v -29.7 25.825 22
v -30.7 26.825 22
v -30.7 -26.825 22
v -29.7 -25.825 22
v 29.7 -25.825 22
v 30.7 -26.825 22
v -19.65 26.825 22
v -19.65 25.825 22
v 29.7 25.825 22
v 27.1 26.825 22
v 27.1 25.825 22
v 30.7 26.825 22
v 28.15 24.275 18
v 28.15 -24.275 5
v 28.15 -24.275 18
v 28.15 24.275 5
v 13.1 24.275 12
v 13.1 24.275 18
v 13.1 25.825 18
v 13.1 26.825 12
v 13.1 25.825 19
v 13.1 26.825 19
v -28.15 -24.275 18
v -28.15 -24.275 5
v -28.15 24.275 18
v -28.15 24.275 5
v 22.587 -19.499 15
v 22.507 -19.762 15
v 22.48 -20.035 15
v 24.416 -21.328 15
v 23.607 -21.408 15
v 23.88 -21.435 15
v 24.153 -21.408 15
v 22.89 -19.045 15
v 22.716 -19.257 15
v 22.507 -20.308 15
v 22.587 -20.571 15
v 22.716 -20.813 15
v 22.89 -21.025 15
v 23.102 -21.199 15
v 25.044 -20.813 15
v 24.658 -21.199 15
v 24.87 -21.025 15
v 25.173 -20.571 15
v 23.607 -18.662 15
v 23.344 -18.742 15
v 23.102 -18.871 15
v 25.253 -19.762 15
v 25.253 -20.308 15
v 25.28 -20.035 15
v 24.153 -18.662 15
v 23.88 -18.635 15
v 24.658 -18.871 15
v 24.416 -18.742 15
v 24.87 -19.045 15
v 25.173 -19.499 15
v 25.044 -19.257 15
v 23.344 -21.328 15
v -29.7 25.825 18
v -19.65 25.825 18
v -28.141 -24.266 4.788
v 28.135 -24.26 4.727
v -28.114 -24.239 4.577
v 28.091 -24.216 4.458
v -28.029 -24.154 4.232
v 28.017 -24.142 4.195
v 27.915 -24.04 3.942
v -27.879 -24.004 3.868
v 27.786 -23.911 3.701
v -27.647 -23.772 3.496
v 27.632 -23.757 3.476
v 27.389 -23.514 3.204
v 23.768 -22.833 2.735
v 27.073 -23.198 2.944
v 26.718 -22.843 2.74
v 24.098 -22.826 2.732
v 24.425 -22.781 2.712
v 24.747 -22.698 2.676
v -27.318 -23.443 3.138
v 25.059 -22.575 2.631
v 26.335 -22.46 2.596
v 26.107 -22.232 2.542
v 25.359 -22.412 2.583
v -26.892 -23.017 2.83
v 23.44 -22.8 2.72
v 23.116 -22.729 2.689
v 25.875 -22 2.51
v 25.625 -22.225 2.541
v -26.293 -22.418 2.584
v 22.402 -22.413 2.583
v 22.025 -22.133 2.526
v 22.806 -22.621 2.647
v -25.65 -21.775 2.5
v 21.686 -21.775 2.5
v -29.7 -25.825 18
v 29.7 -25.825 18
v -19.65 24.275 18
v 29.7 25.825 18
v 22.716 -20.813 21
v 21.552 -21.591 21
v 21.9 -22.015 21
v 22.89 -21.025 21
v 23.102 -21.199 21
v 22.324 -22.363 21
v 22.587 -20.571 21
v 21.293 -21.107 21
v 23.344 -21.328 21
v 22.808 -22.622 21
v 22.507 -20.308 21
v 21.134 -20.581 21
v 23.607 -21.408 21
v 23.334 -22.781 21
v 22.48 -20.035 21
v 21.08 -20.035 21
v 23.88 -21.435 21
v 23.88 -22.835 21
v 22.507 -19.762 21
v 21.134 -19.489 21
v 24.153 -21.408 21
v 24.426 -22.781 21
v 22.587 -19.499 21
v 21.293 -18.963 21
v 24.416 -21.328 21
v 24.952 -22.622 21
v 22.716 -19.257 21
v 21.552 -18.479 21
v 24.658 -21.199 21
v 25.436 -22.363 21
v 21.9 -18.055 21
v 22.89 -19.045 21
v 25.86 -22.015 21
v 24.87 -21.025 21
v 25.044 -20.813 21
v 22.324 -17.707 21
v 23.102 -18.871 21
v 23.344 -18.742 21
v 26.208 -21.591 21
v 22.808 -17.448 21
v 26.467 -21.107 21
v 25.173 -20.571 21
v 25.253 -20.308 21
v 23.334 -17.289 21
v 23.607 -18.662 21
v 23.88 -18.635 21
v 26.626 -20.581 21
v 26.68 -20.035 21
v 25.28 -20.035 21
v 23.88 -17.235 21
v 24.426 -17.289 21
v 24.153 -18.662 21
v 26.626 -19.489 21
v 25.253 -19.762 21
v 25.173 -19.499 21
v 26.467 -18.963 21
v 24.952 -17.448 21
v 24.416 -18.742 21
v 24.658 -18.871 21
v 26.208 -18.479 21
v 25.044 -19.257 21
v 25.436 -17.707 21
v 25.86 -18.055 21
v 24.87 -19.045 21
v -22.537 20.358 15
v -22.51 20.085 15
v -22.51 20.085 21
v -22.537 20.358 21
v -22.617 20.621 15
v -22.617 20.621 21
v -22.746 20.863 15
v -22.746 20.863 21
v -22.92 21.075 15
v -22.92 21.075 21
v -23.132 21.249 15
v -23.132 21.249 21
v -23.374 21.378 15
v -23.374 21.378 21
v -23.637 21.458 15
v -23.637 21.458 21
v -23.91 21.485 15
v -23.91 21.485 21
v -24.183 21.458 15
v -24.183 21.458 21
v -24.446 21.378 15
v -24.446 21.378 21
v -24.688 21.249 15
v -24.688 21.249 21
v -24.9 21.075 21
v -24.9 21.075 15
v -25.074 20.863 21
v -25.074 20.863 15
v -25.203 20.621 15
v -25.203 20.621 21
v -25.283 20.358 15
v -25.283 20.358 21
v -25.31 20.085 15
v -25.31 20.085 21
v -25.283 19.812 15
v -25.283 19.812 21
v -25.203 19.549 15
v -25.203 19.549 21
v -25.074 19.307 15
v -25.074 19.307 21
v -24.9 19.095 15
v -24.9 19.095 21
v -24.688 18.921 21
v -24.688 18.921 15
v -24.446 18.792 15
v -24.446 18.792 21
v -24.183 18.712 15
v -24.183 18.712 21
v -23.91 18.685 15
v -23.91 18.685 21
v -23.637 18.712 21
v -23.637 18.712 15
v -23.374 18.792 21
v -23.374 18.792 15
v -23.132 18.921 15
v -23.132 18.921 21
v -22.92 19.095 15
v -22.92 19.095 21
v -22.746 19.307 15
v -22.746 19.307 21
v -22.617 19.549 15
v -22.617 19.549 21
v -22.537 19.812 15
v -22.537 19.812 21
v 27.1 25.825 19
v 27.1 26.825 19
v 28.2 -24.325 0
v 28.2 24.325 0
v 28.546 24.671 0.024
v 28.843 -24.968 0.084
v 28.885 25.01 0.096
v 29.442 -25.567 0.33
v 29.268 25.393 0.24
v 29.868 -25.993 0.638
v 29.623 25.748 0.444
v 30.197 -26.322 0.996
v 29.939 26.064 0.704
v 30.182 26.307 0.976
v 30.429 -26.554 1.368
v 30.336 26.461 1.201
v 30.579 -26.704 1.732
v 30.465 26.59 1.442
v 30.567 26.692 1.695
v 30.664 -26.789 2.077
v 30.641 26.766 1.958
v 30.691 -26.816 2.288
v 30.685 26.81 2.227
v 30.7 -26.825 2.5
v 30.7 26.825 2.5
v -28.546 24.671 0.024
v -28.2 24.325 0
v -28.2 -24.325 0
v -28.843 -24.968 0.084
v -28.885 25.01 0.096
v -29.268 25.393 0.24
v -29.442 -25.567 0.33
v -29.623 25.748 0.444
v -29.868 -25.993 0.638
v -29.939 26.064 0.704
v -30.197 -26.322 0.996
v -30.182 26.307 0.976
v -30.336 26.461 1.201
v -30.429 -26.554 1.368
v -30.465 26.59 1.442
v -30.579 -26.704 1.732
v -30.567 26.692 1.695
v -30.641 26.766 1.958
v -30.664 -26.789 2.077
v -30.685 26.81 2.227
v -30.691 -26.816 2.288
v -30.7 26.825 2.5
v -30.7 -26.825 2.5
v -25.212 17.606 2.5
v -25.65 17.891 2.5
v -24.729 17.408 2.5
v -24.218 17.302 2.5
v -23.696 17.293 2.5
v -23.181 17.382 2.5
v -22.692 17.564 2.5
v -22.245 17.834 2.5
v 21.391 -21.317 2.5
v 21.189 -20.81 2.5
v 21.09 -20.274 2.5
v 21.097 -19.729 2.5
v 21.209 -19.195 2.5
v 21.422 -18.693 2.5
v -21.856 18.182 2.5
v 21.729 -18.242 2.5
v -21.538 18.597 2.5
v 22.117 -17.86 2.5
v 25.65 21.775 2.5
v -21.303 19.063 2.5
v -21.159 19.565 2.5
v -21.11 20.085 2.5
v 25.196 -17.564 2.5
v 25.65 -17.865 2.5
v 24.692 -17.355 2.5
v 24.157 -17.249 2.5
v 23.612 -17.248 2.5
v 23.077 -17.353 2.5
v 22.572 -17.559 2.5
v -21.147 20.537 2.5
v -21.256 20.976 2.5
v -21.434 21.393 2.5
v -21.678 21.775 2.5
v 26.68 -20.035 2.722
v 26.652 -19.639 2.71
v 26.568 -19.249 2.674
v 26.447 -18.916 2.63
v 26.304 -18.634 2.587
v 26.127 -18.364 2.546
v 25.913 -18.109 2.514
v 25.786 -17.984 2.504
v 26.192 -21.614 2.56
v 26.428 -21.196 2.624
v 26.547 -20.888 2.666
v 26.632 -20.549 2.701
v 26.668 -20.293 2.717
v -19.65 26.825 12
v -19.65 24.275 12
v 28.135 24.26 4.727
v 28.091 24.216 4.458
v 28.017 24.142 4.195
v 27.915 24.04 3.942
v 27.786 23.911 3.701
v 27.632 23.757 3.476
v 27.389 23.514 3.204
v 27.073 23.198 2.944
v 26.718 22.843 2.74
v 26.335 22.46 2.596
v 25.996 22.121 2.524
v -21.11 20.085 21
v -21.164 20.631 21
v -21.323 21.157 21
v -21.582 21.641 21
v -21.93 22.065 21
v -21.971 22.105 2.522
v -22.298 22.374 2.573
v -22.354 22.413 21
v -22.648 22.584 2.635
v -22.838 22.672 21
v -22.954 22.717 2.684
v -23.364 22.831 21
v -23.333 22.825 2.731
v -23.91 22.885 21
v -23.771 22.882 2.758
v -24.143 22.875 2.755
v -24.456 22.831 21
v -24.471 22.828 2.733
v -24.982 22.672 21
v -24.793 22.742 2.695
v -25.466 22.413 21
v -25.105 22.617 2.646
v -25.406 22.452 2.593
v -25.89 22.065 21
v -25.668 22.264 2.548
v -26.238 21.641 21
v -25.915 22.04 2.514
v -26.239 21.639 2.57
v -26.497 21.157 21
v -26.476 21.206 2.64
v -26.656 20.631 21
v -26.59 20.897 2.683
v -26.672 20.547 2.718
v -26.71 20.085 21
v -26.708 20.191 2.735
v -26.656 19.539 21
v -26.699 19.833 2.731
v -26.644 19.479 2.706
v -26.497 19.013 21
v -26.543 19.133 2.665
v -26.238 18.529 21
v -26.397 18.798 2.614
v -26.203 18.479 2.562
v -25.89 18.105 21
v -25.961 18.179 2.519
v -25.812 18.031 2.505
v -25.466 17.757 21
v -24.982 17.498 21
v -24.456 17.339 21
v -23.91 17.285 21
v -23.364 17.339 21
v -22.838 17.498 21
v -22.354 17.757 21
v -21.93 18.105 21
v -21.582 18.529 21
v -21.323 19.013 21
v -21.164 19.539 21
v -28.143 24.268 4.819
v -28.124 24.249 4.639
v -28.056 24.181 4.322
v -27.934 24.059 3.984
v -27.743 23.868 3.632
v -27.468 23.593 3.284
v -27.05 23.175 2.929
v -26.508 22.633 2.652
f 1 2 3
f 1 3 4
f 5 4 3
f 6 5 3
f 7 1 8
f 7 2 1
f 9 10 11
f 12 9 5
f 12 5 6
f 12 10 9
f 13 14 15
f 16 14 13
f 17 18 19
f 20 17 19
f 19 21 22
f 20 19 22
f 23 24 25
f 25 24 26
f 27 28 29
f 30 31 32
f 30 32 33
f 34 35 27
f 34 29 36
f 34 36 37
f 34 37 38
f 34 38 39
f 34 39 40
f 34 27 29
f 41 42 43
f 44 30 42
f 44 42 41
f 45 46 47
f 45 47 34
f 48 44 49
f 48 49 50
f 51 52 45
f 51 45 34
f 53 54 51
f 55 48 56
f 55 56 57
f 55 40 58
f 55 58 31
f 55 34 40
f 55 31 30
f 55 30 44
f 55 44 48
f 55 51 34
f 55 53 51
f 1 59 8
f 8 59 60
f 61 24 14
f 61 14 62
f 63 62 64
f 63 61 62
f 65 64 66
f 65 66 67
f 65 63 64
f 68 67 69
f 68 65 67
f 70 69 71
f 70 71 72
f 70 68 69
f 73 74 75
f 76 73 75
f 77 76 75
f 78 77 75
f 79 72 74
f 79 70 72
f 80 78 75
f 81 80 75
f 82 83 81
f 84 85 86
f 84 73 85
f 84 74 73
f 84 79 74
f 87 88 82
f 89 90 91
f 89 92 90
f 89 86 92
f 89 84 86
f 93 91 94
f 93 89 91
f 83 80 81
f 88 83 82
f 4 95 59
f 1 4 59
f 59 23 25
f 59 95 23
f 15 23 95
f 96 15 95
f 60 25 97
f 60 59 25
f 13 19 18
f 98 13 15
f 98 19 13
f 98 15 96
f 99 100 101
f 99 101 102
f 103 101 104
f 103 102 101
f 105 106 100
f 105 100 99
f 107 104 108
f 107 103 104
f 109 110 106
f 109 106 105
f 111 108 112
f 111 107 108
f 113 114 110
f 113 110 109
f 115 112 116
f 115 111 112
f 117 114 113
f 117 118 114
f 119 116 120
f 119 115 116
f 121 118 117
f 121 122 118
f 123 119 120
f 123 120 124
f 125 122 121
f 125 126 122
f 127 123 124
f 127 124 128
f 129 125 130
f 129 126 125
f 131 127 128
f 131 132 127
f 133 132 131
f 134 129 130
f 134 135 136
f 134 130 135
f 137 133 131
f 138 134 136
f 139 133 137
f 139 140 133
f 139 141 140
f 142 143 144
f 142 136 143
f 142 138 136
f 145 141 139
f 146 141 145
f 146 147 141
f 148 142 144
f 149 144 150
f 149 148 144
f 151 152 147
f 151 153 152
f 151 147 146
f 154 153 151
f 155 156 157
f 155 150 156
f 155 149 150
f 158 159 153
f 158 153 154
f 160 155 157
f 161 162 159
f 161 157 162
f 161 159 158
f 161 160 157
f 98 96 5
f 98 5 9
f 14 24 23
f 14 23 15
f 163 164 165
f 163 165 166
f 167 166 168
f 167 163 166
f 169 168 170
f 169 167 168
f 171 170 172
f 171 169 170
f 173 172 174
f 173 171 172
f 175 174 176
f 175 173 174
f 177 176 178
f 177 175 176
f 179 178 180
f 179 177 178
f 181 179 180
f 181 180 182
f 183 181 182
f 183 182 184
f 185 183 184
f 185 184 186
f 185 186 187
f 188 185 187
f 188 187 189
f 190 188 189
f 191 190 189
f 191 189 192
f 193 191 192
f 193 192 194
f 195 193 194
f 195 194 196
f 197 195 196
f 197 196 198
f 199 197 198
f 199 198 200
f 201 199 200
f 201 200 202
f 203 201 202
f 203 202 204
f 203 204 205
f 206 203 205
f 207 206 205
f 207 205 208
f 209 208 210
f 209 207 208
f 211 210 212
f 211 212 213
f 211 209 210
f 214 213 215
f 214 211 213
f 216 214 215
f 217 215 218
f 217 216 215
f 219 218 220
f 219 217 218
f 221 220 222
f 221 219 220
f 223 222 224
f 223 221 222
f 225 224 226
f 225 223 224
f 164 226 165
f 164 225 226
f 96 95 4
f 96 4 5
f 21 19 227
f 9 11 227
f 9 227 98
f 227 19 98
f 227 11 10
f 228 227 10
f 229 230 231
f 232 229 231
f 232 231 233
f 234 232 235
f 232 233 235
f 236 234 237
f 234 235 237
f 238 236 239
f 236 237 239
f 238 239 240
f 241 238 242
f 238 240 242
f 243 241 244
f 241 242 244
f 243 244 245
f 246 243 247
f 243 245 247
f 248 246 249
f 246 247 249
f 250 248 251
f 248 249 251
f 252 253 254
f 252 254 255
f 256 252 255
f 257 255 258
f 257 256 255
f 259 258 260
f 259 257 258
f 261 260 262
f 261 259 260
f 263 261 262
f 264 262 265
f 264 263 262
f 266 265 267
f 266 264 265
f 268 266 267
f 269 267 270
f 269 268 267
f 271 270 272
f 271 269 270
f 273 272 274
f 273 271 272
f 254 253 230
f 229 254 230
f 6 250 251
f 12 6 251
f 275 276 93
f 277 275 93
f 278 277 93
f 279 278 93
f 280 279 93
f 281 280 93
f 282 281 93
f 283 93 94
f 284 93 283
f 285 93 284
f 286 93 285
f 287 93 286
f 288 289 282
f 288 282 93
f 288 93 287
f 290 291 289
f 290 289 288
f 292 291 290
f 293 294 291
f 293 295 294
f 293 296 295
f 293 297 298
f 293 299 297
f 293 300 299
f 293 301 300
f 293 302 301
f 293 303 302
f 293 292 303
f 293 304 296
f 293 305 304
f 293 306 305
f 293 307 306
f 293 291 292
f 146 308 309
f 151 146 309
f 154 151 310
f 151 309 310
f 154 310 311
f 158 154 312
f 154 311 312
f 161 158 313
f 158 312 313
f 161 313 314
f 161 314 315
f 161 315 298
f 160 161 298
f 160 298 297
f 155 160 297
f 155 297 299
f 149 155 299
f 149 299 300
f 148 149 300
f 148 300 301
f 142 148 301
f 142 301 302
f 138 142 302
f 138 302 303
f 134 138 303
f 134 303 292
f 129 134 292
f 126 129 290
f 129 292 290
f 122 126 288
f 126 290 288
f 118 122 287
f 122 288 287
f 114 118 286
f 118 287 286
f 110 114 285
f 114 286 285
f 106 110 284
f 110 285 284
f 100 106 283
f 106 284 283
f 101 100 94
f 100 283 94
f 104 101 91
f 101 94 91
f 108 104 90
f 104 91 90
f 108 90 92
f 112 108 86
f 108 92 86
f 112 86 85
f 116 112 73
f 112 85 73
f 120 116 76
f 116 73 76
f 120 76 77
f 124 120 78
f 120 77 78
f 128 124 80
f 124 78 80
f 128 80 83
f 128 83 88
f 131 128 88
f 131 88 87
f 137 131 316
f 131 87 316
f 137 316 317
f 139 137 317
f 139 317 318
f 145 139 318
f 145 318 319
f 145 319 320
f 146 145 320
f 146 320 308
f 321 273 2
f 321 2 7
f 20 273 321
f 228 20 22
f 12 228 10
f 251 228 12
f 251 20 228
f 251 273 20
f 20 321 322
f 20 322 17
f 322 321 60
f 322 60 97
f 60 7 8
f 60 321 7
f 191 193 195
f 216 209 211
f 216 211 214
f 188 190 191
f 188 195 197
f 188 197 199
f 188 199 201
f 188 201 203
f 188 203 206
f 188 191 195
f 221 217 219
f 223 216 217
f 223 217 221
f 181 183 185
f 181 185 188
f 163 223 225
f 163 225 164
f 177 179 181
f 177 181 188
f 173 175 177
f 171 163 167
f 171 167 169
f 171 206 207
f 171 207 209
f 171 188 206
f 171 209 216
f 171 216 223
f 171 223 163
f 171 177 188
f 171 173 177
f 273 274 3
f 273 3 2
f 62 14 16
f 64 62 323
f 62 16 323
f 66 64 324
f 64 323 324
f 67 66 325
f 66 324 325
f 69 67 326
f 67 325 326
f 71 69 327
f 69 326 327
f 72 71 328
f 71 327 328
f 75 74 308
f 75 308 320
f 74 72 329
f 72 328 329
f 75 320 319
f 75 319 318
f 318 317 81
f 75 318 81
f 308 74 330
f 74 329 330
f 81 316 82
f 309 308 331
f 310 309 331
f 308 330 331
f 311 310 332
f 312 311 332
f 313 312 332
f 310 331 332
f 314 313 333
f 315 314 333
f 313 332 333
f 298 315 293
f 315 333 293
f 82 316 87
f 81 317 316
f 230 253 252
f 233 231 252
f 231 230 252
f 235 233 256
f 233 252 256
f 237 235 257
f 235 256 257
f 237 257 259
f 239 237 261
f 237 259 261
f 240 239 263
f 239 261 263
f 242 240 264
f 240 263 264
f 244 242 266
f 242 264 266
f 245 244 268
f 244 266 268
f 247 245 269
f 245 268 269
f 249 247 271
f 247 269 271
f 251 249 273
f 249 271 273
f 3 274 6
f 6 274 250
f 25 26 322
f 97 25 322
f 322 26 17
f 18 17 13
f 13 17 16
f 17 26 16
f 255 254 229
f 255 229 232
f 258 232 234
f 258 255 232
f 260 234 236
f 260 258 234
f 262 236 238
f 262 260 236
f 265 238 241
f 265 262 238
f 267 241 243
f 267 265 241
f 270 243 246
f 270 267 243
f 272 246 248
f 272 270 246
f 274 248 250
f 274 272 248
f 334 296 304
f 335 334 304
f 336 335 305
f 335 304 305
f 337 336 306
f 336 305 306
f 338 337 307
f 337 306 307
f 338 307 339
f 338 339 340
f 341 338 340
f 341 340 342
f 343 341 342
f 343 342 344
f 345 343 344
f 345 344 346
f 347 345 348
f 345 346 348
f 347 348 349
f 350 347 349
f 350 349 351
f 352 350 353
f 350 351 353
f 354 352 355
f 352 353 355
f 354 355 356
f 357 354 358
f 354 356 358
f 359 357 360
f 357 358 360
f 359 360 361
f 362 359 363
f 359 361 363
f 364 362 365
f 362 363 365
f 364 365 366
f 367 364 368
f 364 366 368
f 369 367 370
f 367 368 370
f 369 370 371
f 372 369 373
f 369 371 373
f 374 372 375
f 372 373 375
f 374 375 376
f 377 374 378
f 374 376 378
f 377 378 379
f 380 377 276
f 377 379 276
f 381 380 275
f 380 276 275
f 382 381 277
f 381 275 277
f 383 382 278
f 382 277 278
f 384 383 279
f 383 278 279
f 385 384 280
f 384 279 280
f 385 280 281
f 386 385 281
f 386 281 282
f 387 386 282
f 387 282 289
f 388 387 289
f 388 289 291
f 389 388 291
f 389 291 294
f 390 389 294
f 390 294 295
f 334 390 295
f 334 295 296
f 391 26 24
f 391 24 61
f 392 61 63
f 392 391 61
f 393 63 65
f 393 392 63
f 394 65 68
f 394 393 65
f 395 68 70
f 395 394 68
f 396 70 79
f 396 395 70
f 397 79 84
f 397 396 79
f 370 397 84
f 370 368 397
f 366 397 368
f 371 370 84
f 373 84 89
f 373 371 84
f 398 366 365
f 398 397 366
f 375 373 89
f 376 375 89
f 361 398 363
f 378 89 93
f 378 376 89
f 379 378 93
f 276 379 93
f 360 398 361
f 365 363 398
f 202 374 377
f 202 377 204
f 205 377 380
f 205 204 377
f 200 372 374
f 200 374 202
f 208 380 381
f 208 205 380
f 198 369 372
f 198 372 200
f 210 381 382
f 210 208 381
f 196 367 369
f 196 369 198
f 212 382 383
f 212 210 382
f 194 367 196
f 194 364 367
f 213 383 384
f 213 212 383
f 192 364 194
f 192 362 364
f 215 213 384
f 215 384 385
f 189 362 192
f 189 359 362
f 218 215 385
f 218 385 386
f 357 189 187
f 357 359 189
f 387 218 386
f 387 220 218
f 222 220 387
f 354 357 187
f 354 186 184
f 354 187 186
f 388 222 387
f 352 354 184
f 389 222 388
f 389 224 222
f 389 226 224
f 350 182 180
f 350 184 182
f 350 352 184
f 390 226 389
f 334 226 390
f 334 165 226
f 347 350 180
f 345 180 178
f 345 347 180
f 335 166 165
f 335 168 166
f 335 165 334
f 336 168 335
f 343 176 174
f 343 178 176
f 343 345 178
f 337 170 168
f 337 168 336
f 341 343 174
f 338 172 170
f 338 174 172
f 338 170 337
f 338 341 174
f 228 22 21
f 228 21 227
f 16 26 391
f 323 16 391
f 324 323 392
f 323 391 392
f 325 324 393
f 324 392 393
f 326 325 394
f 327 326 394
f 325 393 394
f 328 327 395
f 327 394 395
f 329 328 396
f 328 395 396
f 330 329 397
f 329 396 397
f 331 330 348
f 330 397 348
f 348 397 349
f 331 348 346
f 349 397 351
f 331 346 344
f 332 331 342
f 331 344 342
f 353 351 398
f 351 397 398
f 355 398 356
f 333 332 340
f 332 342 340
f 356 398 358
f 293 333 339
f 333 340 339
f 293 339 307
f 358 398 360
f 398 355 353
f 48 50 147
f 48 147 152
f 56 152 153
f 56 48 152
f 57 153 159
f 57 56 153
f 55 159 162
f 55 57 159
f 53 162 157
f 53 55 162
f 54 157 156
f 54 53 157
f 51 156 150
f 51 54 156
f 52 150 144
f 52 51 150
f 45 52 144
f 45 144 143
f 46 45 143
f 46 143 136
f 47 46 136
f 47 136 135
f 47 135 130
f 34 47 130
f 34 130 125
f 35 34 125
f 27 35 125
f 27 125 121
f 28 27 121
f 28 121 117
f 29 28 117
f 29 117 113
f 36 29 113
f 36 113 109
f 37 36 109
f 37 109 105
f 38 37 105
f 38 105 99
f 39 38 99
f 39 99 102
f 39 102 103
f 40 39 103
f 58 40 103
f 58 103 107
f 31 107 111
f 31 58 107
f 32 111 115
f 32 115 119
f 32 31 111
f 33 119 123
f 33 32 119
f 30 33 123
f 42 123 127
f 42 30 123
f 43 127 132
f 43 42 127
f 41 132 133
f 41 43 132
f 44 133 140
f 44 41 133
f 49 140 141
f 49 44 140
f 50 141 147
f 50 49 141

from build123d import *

# Parameters (mm, degrees)
F0_W        = 56.3
F0_H        = 48.55
F0_R        = 2.8
F1_DEPTH    = 2.5
F0_W_2      = 59.4
F0_H_2      = 51.65
F2_DEPTH    = 18
F0_W_3      = 61.4
F0_H_3      = 53.65
F3_DEPTH    = 22
F0_R_2      = 1.4
F4_DEPTH    = 21
F5_DEPTH    = 15
F6_T1_DEPTH = 48.55
F6_T3_DEPTH = 56.3
F6_T5_DEPTH = 73.9
F6_T7_DEPTH = 66.15
F7_W        = 32.75
F7_H        = 1
F7_H_2      = 1.55
F8_DEPTH    = 10
F7_W_2      = 14
F9_DEPTH    = 3


# Not quite as in the source:
# - a fillet or chamfer that OpenCascade refuses, or shapes differently, is made with other operations: its cross-section is extruded or revolved along the edge and cut away or added


with BuildPart() as f1:
    # F0 (on Top) → F1 (new body)
    with BuildSketch(Plane.XY):
        Rectangle(F0_W, F0_H)
        with Locations((23.88, -20.035)):
            Circle(F0_R, mode=Mode.SUBTRACT)
        with Locations((-23.91, 20.085)):
            Circle(F0_R, mode=Mode.SUBTRACT)
    extrude(amount=F1_DEPTH)

    # F0 (on Top) → F2 (join)
    with BuildSketch(Plane.XY):
        Rectangle(F0_W_2, F0_H_2)
        Rectangle(F0_W, F0_H, mode=Mode.SUBTRACT)
    extrude(amount=F2_DEPTH)

    # F0 (on Top) → F3 (join)
    with BuildSketch(Plane.XY):
        Rectangle(F0_W_3, F0_H_3)
        Rectangle(F0_W_2, F0_H_2, mode=Mode.SUBTRACT)
    extrude(amount=F3_DEPTH)

    # F0 (on Top) → F4 (join)
    with BuildSketch(Plane.XY):
        with Locations((-23.91, 20.085)):
            Circle(F0_R)
        with Locations((-23.91, 20.085)):
            Circle(F0_R_2, mode=Mode.SUBTRACT)
        with Locations((23.88, -20.035)):
            Circle(F0_R)
        with Locations((23.88, -20.035)):
            Circle(F0_R_2, mode=Mode.SUBTRACT)
    extrude(amount=F4_DEPTH)

    # F0 (on Top) → F5 (join)
    with BuildSketch(Plane.XY):
        with Locations((23.88, -20.035)):
            Circle(F0_R_2)
        with Locations((-23.91, 20.085)):
            Circle(F0_R_2)
    extrude(amount=F5_DEPTH)

    # F6: fillet of radius 2.5 on 8 edges, made by hand

    # F6_s2 → F6_t1 (join)
    with BuildSketch(Plane.XZ.offset(-24.275)):
        with BuildLine():
            ThreePointArc((28.15, 5), (27.417766953, 3.232233047), (25.65, 2.5))
            Line((25.65, 2.5), (28.15, 2.5))
            Line((28.15, 2.5), (28.15, 5))
        make_face()
        with BuildLine():
            ThreePointArc((-28.15, 5), (-27.417766953, 3.232233047), (-25.65, 2.5))
            Line((-25.65, 2.5), (-28.15, 2.5))
            Line((-28.15, 2.5), (-28.15, 5))
        make_face()
    extrude(amount=F6_T1_DEPTH)

    # F6_s4 → F6_t3 (join)
    with BuildSketch(Plane.YZ.offset(-28.15)):
        with BuildLine():
            ThreePointArc((24.275, 5), (23.542766953, 3.232233047), (21.775, 2.5))
            Line((21.775, 2.5), (24.275, 2.5))
            Line((24.275, 2.5), (24.275, 5))
        make_face()
        with BuildLine():
            ThreePointArc((-24.275, 5), (-23.542766953, 3.232233047), (-21.775, 2.5))
            Line((-21.775, 2.5), (-24.275, 2.5))
            Line((-24.275, 2.5), (-24.275, 5))
        make_face()
    extrude(amount=F6_T3_DEPTH)

    # F6_s6 → F6_t5 (cut)
    with BuildSketch(Plane.YZ.offset(-36.95)):
        with BuildLine():
            ThreePointArc((-24.325, 0), (-26.092766953, 0.732233047), (-26.825, 2.5))
            Line((-26.825, 2.5), (-26.825, 0))
            Line((-26.825, 0), (-24.325, 0))
        make_face()
        with BuildLine():
            ThreePointArc((24.325, 0), (26.092766953, 0.732233047), (26.825, 2.5))
            Line((26.825, 2.5), (26.825, 0))
            Line((26.825, 0), (24.325, 0))
        make_face()
    extrude(amount=F6_T5_DEPTH, mode=Mode.SUBTRACT)

    # F6_s8 → F6_t7 (cut)
    with BuildSketch(Plane.XZ.offset(-33.075)):
        with BuildLine():
            ThreePointArc((28.2, 0), (29.967766953, 0.732233047), (30.7, 2.5))
            Line((30.7, 2.5), (30.7, 0))
            Line((30.7, 0), (28.2, 0))
        make_face()
        with BuildLine():
            ThreePointArc((-28.2, 0), (-29.967766953, 0.732233047), (-30.7, 2.5))
            Line((-30.7, 2.5), (-30.7, 0))
            Line((-30.7, 0), (-28.2, 0))
        make_face()
    extrude(amount=F6_T7_DEPTH, mode=Mode.SUBTRACT)

    # F7 (on face) → F8 (cut)
    with BuildSketch(Plane.XY.offset(22)):
        with Locations((-3.275, 26.325)):
            Rectangle(F7_W, F7_H)
        with Locations((-3.275, 25.05)):
            Rectangle(F7_W, F7_H_2)
    extrude(amount=-F8_DEPTH, mode=Mode.SUBTRACT)

    # F7 (on face) → F9 (cut)
    with BuildSketch(Plane.XY.offset(22)):
        with Locations((20.1, 26.325)):
            Rectangle(F7_W_2, F7_H)
        with Locations((20.1, 25.05)):
            Rectangle(F7_W_2, F7_H_2)
    extrude(amount=-F9_DEPTH, mode=Mode.SUBTRACT)


solid = f1.part
